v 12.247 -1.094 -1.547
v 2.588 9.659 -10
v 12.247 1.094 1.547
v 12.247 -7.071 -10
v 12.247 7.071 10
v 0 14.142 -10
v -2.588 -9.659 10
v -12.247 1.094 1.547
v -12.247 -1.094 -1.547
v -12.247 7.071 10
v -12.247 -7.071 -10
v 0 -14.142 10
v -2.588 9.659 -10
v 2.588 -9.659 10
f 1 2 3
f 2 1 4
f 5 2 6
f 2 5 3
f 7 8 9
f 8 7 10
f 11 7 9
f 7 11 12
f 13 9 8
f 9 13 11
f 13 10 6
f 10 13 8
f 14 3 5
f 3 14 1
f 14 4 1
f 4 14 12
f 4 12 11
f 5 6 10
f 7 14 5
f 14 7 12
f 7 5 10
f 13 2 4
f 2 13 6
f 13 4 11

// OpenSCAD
module box(size) {
    cube([2*size, 2*size, size], center = true); 
}

module octahedron(size) {
      dihedral = 109.47122;
      n = 3;
      intersection(){
            box(size);
            intersection_for(i=[1:n])  { 
                rotate([dihedral, 0, 360 /n * i])  box(size); 
           }
      }
}

octahedron(20);
